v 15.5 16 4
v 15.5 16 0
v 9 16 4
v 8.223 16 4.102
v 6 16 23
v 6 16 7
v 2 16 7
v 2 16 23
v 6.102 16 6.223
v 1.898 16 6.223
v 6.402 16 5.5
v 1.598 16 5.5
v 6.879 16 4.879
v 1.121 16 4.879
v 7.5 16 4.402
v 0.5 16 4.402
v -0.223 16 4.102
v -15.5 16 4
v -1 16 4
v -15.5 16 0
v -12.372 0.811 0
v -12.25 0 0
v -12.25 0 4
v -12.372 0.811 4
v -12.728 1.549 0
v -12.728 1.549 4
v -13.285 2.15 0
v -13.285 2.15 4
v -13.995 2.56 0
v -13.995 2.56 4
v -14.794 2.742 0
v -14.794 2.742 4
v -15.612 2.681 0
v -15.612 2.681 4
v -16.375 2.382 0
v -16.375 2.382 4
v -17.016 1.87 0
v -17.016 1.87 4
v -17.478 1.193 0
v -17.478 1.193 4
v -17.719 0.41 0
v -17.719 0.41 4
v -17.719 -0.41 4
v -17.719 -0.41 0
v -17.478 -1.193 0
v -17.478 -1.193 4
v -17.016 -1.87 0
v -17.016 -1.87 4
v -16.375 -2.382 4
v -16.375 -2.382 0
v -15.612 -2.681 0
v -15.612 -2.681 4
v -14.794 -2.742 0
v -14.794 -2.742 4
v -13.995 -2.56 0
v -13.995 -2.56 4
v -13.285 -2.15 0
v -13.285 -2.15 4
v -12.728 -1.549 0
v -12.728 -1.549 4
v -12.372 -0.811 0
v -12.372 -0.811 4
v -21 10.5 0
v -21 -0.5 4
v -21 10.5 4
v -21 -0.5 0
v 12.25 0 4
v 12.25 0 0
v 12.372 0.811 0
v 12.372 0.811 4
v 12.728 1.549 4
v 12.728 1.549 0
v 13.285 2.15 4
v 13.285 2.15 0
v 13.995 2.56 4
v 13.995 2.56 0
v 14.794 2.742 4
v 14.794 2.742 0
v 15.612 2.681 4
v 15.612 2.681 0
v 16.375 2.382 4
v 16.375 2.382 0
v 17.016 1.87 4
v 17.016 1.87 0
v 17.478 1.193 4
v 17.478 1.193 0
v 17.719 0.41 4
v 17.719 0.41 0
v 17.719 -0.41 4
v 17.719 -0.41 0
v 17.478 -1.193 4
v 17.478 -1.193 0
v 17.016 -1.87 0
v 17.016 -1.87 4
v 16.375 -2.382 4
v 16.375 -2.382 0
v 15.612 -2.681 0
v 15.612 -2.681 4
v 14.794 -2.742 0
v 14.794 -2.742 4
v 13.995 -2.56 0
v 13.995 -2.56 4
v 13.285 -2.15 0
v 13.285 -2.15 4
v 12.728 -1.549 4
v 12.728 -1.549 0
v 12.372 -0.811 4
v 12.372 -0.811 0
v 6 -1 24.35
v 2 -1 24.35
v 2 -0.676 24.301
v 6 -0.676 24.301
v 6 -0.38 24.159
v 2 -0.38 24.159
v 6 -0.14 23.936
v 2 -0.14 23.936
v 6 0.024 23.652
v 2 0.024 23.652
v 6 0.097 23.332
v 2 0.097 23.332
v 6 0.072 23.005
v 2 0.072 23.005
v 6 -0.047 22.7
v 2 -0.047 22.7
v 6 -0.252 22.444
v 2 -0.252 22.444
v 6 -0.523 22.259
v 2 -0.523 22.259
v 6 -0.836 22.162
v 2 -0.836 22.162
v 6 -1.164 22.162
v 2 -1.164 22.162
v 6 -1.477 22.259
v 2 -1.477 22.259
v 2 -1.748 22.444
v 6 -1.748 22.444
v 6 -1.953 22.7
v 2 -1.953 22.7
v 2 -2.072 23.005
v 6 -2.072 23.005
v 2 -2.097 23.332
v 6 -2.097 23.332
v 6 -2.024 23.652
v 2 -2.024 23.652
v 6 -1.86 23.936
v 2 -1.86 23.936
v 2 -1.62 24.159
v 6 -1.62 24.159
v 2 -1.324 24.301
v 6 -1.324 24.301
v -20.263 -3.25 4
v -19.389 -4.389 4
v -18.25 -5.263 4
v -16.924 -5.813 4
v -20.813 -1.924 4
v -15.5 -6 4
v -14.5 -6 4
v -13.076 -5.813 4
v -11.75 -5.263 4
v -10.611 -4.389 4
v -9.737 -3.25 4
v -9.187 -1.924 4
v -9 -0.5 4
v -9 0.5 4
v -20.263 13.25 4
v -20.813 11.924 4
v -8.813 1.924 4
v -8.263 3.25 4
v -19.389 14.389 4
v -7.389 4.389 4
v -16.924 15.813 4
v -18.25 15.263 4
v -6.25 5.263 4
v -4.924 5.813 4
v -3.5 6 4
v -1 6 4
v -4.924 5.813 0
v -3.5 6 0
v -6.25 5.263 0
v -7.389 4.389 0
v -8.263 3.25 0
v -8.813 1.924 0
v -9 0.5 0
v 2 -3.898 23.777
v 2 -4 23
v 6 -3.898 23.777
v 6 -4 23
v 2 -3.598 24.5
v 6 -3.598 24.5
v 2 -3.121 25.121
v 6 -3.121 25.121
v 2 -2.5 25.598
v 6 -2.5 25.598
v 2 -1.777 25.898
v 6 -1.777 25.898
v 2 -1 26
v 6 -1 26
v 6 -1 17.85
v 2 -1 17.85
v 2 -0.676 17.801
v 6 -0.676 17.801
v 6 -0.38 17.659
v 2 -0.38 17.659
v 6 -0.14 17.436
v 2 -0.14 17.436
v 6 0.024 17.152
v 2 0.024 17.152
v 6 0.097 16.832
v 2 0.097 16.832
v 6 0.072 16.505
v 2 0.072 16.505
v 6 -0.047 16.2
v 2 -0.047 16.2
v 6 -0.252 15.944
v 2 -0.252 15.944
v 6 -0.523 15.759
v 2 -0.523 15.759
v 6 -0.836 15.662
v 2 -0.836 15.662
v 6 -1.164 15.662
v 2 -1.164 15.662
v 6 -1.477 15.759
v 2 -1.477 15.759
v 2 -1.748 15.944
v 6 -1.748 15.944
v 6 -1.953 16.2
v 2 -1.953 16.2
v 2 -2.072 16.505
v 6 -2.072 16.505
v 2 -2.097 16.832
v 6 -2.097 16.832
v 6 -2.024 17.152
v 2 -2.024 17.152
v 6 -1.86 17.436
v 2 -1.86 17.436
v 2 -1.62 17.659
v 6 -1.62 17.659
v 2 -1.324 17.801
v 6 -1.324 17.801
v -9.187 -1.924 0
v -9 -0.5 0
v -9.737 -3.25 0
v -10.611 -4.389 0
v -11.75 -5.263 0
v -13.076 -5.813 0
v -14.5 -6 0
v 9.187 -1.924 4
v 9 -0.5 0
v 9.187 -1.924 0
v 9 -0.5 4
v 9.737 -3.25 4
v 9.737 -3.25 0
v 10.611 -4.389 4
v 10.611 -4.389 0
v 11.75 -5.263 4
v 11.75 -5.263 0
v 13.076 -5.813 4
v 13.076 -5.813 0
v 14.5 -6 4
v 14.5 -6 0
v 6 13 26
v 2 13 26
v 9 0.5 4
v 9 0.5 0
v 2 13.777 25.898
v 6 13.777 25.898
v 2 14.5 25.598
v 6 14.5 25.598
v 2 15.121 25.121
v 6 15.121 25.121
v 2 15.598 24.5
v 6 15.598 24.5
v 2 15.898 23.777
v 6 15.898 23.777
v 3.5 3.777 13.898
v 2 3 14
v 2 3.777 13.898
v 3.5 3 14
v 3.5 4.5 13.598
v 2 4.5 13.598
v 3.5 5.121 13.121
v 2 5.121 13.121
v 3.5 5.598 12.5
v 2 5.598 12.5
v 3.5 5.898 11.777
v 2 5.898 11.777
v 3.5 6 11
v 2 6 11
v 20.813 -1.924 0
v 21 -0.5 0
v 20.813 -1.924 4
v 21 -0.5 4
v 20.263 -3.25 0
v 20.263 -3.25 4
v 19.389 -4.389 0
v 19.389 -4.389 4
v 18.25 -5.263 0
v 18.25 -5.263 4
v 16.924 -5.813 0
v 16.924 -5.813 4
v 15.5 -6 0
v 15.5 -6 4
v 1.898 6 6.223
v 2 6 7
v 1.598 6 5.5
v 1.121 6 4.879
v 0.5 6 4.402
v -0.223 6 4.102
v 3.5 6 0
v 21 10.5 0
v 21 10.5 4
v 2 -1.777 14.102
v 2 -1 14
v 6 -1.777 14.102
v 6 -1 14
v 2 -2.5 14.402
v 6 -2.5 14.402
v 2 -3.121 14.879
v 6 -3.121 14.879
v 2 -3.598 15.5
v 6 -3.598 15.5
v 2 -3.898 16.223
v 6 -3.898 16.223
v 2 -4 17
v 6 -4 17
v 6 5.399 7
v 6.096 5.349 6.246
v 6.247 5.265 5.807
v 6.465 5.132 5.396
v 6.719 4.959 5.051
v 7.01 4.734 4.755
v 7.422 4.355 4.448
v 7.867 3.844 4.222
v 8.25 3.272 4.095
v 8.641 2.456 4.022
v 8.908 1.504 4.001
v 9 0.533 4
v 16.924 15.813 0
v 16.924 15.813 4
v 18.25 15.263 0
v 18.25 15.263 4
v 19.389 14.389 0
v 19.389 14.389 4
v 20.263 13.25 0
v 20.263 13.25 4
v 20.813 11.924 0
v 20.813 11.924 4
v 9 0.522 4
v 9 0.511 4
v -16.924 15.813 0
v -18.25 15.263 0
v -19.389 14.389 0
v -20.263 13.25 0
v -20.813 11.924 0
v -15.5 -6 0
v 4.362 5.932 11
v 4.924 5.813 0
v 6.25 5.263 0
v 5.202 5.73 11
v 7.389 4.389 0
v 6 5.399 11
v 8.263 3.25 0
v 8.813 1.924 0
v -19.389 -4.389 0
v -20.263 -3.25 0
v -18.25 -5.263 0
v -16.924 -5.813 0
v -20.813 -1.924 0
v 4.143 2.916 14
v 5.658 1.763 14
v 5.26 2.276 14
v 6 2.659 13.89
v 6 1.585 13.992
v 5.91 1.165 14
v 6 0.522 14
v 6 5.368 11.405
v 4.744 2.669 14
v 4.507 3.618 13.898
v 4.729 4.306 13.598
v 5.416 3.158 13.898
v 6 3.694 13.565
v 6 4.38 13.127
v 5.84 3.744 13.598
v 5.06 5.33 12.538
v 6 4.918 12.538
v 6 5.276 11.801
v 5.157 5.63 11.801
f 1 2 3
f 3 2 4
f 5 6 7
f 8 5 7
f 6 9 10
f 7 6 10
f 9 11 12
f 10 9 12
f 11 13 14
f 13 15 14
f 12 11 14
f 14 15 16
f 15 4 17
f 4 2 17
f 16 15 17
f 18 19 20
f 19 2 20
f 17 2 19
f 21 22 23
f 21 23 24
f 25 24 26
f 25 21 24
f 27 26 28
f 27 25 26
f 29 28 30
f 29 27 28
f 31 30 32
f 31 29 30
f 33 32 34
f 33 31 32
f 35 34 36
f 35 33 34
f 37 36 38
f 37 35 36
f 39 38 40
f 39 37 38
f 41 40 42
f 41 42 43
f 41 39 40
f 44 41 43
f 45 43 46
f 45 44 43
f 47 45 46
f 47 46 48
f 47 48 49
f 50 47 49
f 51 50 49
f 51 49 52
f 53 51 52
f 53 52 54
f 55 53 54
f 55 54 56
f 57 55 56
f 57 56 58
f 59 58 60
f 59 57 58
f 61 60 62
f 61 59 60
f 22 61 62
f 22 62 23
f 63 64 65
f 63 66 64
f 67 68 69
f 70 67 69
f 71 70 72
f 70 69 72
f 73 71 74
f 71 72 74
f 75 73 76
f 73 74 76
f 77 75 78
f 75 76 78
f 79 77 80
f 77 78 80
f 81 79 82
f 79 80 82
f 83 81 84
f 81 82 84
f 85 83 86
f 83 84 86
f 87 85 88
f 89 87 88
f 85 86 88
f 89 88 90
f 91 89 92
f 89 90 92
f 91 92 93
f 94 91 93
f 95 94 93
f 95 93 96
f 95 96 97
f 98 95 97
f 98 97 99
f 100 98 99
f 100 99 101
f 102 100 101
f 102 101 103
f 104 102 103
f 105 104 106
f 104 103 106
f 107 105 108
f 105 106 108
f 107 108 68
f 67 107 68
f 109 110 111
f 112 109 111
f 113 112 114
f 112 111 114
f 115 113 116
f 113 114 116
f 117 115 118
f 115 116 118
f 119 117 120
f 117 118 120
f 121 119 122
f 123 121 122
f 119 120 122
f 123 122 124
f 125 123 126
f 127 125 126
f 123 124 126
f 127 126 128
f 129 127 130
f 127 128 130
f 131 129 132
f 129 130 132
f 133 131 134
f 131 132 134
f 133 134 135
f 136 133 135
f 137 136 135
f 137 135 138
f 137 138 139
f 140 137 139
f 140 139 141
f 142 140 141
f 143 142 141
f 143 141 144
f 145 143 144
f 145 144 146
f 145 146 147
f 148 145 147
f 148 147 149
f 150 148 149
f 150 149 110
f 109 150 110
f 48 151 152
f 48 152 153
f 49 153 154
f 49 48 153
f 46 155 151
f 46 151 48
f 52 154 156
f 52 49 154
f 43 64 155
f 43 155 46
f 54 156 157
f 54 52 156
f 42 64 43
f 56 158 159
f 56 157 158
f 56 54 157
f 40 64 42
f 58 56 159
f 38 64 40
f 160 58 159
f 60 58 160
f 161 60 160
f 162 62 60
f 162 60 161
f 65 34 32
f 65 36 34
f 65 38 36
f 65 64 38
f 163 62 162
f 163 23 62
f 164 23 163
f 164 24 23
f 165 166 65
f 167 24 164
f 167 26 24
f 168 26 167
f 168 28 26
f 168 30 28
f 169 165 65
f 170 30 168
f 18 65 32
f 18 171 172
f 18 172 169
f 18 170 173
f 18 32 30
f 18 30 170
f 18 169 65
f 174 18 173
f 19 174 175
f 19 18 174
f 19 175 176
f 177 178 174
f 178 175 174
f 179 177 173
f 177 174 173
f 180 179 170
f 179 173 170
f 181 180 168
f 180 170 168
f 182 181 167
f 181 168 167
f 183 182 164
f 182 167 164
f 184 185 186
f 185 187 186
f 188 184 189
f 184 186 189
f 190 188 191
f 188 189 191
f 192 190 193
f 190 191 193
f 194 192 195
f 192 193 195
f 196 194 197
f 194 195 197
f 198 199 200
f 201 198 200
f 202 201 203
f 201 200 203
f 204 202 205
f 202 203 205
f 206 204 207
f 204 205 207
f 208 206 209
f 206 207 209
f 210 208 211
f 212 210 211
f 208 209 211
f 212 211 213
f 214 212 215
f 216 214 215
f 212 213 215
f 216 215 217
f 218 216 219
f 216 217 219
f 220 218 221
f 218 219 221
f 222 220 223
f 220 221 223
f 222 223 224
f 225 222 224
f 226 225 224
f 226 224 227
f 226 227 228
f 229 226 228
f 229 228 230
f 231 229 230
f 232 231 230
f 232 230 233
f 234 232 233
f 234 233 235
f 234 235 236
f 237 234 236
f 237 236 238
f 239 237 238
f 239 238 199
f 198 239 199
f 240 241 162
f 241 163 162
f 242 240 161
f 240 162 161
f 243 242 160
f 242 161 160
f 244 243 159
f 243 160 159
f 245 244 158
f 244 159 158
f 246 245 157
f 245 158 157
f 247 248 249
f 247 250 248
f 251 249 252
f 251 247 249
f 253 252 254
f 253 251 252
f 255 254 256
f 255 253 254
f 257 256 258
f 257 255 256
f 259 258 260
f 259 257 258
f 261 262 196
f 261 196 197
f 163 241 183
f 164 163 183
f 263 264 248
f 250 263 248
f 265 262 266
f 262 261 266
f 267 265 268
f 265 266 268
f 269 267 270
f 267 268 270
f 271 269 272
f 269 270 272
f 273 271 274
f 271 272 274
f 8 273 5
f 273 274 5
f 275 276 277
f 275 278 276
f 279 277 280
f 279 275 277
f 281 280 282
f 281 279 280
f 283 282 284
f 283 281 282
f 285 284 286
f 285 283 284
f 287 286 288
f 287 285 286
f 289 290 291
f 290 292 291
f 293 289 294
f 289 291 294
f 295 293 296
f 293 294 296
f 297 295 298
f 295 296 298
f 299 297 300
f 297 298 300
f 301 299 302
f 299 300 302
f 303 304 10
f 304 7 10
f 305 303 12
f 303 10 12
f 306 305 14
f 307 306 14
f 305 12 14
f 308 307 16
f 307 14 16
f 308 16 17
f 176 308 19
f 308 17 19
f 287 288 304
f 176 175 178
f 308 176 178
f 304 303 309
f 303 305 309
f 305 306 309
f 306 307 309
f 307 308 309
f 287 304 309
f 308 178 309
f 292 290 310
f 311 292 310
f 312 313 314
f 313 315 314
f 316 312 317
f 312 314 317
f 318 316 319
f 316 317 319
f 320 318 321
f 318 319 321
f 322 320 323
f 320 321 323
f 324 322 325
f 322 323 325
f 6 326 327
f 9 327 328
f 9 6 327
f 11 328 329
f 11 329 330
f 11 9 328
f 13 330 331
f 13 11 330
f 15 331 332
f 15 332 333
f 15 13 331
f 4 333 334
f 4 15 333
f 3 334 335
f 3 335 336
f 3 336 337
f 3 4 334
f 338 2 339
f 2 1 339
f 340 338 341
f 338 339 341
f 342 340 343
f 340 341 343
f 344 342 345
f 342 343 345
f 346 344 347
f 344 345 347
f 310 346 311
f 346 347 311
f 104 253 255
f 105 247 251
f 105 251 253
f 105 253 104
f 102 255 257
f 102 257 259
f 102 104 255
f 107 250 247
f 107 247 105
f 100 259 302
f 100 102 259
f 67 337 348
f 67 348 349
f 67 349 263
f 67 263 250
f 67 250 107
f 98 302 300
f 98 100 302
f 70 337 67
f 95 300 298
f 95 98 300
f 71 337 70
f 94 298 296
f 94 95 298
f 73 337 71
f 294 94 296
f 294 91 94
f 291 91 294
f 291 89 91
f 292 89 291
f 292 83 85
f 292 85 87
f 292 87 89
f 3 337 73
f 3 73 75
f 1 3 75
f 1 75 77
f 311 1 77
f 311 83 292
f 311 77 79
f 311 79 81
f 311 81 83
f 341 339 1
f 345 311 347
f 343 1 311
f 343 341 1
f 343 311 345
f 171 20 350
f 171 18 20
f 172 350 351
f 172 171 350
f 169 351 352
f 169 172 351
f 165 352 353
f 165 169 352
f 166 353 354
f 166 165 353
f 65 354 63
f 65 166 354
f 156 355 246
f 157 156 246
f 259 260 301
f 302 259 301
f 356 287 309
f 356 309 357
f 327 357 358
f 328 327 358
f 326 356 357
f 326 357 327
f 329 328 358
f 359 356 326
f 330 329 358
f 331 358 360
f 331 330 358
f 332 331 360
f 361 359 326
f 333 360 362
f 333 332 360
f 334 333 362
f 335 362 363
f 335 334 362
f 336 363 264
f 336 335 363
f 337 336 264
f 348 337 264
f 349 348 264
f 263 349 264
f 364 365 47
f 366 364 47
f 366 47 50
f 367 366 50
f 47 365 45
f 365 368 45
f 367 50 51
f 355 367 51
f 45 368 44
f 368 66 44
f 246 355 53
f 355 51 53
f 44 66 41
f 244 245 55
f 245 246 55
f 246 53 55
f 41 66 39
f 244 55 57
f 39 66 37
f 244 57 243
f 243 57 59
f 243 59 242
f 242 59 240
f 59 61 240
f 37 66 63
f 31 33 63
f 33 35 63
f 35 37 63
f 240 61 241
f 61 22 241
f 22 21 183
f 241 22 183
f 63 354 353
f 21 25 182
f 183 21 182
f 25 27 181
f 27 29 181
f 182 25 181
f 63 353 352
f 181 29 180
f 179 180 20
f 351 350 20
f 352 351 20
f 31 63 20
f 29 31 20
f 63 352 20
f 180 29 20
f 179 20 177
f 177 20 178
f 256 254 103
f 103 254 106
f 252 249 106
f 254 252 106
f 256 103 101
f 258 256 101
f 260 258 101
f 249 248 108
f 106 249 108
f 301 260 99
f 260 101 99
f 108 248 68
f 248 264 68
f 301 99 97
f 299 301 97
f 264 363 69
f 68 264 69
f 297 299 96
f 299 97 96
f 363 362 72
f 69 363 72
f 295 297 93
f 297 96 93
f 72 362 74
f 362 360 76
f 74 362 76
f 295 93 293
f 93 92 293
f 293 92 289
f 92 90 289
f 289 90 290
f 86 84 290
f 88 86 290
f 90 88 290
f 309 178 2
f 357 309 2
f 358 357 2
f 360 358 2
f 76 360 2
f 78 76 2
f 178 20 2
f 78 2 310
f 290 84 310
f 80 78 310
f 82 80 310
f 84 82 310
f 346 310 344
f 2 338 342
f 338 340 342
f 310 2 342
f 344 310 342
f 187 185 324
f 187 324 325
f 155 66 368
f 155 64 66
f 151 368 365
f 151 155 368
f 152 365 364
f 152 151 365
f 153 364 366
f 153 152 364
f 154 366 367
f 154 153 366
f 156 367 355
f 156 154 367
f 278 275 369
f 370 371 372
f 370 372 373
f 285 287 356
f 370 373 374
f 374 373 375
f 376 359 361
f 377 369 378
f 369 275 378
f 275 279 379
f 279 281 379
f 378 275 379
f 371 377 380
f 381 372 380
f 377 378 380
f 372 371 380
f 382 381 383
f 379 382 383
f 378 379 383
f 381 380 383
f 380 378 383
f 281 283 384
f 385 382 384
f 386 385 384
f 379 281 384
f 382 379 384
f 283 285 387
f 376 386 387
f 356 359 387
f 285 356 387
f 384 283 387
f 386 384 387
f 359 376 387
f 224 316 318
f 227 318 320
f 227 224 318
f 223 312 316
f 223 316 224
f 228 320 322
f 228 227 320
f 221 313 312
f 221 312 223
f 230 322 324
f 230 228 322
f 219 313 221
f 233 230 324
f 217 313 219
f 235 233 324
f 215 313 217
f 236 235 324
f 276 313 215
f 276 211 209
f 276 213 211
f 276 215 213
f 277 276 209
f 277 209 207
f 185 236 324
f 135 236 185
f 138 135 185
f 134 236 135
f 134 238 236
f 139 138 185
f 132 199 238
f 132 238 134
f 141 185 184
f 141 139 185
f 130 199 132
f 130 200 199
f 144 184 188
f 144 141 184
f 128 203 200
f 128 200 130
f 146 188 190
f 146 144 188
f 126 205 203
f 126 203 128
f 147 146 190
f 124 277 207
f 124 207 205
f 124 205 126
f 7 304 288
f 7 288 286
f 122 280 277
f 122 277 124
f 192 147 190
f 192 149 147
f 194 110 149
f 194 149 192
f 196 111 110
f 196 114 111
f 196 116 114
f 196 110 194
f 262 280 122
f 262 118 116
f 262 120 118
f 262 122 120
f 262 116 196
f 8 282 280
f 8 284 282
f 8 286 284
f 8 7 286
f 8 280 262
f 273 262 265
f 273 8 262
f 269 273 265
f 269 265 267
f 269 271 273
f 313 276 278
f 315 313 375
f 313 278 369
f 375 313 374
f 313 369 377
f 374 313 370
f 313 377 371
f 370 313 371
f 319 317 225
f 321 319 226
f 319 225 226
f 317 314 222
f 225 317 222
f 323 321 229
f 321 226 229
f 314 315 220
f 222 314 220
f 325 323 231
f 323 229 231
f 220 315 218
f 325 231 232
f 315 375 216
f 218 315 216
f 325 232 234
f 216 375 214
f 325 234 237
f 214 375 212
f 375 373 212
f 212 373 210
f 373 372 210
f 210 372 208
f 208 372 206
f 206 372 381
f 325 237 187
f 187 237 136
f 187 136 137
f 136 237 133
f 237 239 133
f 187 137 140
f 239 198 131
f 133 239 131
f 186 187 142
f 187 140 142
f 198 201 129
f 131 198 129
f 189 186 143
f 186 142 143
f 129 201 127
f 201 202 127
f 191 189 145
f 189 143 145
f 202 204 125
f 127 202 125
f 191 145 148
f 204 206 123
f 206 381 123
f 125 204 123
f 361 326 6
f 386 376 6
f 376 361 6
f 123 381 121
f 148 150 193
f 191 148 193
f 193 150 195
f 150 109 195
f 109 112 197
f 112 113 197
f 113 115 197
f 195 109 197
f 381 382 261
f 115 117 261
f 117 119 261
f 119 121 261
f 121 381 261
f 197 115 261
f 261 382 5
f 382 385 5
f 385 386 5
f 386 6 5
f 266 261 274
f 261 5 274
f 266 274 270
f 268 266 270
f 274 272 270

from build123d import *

# Parameters (mm, degrees)
SKETCH1_W           = 12
SKETCH1_H           = 12
SKETCH1_R           = 2.75
BOSS_EXTRUDE1_DEPTH = 4
SKETCH2_W           = 4
SKETCH2_H           = 10
BOSS_EXTRUDE2_DEPTH = 22
SKETCH3_W           = 4
SKETCH3_H           = 12
BOSS_EXTRUDE3_DEPTH = 10
SKETCH4_R           = 1.1
CUT_EXTRUDE1_DEPTH  = 18
FILLET1_R           = 5.5
FILLET2_R           = 3


with BuildPart() as part:
    # Sketch1 → Boss-Extrude1 (new body)
    # profile 1 of 4: a face of its own
    with BuildSketch(Plane.XY):
        Polygon((9, 6), (9, 0), (9, -6), (21, -6), (21, 6), align=None)
        with BuildLine():
            ThreePointArc((17.75, 0), (15, -2.75), (12.25, 0))
            ThreePointArc((12.25, 0), (15, 2.75), (17.75, 0))
        make_face(mode=Mode.SUBTRACT)
    # profile 2 of 4: a face of its own
    with BuildSketch(Plane.XY):
        Polygon((0, 6), (9, 6), (21, 6), (21, 16), (0, 16), align=None)
    # profile 3 of 4: a face of its own
    with BuildSketch(Plane.XY):
        Polygon((-9, 6), (0, 6), (0, 16), (-21, 16), (-21, 6), align=None)
    # profile 4 of 4: a face of its own
    with BuildSketch(Plane.XY):
        with Locations((-15, 0)):
            Rectangle(SKETCH1_W, SKETCH1_H)
        with Locations((-15, 0)):
            Circle(SKETCH1_R, mode=Mode.SUBTRACT)
    extrude(amount=BOSS_EXTRUDE1_DEPTH)

    # Sketch2 → Boss-Extrude2 (add)
    with BuildSketch(Plane.XY.offset(4)):
        with Locations((4, 11)):
            Rectangle(SKETCH2_W, SKETCH2_H)
    extrude(amount=BOSS_EXTRUDE2_DEPTH)

    # Sketch3 → Boss-Extrude3 (add)
    with BuildSketch(Plane.XZ.offset(-6)):
        with Locations((4, 20)):
            Rectangle(SKETCH3_W, SKETCH3_H)
    extrude(amount=BOSS_EXTRUDE3_DEPTH)

    # Sketch4 → Cut-Extrude1 (cut)
    with BuildSketch(Plane.ZY.offset(-2)):
        with Locations((23.25, -1)):
            Circle(SKETCH4_R)
        with Locations((16.75, -1)):
            Circle(SKETCH4_R)
    extrude(amount=-CUT_EXTRUDE1_DEPTH, mode=Mode.SUBTRACT)

    # Fillet1
    fillet1_edges = [part.edges().sort_by_distance(p)[0] for p in [
        (-21, 16, 2),
        (21, 16, 2),
        (21, -6, 2),
        (9, -6, 2),
        (9, 6, 2),
        (-9, 6, 2),
        (-9, -6, 2),
        (-21, -6, 2),
    ]]
    fillet(fillet1_edges, radius=FILLET1_R)

    # Fillet2
    fillet2_edges = [part.edges().sort_by_distance(p)[0] for p in [
        (2.75, 6, 14),
        (4.785615189, 5.847634392, 14),
        (6, 10.699489743, 4),
        (2, 11, 4),
        (4, 16, 26),
        (4, -4, 26),
        (4, -4, 14),
    ]]
    fillet(fillet2_edges, radius=FILLET2_R - 0.0001)  # a hair under: the kernel refuses the full size


solid = part.part
